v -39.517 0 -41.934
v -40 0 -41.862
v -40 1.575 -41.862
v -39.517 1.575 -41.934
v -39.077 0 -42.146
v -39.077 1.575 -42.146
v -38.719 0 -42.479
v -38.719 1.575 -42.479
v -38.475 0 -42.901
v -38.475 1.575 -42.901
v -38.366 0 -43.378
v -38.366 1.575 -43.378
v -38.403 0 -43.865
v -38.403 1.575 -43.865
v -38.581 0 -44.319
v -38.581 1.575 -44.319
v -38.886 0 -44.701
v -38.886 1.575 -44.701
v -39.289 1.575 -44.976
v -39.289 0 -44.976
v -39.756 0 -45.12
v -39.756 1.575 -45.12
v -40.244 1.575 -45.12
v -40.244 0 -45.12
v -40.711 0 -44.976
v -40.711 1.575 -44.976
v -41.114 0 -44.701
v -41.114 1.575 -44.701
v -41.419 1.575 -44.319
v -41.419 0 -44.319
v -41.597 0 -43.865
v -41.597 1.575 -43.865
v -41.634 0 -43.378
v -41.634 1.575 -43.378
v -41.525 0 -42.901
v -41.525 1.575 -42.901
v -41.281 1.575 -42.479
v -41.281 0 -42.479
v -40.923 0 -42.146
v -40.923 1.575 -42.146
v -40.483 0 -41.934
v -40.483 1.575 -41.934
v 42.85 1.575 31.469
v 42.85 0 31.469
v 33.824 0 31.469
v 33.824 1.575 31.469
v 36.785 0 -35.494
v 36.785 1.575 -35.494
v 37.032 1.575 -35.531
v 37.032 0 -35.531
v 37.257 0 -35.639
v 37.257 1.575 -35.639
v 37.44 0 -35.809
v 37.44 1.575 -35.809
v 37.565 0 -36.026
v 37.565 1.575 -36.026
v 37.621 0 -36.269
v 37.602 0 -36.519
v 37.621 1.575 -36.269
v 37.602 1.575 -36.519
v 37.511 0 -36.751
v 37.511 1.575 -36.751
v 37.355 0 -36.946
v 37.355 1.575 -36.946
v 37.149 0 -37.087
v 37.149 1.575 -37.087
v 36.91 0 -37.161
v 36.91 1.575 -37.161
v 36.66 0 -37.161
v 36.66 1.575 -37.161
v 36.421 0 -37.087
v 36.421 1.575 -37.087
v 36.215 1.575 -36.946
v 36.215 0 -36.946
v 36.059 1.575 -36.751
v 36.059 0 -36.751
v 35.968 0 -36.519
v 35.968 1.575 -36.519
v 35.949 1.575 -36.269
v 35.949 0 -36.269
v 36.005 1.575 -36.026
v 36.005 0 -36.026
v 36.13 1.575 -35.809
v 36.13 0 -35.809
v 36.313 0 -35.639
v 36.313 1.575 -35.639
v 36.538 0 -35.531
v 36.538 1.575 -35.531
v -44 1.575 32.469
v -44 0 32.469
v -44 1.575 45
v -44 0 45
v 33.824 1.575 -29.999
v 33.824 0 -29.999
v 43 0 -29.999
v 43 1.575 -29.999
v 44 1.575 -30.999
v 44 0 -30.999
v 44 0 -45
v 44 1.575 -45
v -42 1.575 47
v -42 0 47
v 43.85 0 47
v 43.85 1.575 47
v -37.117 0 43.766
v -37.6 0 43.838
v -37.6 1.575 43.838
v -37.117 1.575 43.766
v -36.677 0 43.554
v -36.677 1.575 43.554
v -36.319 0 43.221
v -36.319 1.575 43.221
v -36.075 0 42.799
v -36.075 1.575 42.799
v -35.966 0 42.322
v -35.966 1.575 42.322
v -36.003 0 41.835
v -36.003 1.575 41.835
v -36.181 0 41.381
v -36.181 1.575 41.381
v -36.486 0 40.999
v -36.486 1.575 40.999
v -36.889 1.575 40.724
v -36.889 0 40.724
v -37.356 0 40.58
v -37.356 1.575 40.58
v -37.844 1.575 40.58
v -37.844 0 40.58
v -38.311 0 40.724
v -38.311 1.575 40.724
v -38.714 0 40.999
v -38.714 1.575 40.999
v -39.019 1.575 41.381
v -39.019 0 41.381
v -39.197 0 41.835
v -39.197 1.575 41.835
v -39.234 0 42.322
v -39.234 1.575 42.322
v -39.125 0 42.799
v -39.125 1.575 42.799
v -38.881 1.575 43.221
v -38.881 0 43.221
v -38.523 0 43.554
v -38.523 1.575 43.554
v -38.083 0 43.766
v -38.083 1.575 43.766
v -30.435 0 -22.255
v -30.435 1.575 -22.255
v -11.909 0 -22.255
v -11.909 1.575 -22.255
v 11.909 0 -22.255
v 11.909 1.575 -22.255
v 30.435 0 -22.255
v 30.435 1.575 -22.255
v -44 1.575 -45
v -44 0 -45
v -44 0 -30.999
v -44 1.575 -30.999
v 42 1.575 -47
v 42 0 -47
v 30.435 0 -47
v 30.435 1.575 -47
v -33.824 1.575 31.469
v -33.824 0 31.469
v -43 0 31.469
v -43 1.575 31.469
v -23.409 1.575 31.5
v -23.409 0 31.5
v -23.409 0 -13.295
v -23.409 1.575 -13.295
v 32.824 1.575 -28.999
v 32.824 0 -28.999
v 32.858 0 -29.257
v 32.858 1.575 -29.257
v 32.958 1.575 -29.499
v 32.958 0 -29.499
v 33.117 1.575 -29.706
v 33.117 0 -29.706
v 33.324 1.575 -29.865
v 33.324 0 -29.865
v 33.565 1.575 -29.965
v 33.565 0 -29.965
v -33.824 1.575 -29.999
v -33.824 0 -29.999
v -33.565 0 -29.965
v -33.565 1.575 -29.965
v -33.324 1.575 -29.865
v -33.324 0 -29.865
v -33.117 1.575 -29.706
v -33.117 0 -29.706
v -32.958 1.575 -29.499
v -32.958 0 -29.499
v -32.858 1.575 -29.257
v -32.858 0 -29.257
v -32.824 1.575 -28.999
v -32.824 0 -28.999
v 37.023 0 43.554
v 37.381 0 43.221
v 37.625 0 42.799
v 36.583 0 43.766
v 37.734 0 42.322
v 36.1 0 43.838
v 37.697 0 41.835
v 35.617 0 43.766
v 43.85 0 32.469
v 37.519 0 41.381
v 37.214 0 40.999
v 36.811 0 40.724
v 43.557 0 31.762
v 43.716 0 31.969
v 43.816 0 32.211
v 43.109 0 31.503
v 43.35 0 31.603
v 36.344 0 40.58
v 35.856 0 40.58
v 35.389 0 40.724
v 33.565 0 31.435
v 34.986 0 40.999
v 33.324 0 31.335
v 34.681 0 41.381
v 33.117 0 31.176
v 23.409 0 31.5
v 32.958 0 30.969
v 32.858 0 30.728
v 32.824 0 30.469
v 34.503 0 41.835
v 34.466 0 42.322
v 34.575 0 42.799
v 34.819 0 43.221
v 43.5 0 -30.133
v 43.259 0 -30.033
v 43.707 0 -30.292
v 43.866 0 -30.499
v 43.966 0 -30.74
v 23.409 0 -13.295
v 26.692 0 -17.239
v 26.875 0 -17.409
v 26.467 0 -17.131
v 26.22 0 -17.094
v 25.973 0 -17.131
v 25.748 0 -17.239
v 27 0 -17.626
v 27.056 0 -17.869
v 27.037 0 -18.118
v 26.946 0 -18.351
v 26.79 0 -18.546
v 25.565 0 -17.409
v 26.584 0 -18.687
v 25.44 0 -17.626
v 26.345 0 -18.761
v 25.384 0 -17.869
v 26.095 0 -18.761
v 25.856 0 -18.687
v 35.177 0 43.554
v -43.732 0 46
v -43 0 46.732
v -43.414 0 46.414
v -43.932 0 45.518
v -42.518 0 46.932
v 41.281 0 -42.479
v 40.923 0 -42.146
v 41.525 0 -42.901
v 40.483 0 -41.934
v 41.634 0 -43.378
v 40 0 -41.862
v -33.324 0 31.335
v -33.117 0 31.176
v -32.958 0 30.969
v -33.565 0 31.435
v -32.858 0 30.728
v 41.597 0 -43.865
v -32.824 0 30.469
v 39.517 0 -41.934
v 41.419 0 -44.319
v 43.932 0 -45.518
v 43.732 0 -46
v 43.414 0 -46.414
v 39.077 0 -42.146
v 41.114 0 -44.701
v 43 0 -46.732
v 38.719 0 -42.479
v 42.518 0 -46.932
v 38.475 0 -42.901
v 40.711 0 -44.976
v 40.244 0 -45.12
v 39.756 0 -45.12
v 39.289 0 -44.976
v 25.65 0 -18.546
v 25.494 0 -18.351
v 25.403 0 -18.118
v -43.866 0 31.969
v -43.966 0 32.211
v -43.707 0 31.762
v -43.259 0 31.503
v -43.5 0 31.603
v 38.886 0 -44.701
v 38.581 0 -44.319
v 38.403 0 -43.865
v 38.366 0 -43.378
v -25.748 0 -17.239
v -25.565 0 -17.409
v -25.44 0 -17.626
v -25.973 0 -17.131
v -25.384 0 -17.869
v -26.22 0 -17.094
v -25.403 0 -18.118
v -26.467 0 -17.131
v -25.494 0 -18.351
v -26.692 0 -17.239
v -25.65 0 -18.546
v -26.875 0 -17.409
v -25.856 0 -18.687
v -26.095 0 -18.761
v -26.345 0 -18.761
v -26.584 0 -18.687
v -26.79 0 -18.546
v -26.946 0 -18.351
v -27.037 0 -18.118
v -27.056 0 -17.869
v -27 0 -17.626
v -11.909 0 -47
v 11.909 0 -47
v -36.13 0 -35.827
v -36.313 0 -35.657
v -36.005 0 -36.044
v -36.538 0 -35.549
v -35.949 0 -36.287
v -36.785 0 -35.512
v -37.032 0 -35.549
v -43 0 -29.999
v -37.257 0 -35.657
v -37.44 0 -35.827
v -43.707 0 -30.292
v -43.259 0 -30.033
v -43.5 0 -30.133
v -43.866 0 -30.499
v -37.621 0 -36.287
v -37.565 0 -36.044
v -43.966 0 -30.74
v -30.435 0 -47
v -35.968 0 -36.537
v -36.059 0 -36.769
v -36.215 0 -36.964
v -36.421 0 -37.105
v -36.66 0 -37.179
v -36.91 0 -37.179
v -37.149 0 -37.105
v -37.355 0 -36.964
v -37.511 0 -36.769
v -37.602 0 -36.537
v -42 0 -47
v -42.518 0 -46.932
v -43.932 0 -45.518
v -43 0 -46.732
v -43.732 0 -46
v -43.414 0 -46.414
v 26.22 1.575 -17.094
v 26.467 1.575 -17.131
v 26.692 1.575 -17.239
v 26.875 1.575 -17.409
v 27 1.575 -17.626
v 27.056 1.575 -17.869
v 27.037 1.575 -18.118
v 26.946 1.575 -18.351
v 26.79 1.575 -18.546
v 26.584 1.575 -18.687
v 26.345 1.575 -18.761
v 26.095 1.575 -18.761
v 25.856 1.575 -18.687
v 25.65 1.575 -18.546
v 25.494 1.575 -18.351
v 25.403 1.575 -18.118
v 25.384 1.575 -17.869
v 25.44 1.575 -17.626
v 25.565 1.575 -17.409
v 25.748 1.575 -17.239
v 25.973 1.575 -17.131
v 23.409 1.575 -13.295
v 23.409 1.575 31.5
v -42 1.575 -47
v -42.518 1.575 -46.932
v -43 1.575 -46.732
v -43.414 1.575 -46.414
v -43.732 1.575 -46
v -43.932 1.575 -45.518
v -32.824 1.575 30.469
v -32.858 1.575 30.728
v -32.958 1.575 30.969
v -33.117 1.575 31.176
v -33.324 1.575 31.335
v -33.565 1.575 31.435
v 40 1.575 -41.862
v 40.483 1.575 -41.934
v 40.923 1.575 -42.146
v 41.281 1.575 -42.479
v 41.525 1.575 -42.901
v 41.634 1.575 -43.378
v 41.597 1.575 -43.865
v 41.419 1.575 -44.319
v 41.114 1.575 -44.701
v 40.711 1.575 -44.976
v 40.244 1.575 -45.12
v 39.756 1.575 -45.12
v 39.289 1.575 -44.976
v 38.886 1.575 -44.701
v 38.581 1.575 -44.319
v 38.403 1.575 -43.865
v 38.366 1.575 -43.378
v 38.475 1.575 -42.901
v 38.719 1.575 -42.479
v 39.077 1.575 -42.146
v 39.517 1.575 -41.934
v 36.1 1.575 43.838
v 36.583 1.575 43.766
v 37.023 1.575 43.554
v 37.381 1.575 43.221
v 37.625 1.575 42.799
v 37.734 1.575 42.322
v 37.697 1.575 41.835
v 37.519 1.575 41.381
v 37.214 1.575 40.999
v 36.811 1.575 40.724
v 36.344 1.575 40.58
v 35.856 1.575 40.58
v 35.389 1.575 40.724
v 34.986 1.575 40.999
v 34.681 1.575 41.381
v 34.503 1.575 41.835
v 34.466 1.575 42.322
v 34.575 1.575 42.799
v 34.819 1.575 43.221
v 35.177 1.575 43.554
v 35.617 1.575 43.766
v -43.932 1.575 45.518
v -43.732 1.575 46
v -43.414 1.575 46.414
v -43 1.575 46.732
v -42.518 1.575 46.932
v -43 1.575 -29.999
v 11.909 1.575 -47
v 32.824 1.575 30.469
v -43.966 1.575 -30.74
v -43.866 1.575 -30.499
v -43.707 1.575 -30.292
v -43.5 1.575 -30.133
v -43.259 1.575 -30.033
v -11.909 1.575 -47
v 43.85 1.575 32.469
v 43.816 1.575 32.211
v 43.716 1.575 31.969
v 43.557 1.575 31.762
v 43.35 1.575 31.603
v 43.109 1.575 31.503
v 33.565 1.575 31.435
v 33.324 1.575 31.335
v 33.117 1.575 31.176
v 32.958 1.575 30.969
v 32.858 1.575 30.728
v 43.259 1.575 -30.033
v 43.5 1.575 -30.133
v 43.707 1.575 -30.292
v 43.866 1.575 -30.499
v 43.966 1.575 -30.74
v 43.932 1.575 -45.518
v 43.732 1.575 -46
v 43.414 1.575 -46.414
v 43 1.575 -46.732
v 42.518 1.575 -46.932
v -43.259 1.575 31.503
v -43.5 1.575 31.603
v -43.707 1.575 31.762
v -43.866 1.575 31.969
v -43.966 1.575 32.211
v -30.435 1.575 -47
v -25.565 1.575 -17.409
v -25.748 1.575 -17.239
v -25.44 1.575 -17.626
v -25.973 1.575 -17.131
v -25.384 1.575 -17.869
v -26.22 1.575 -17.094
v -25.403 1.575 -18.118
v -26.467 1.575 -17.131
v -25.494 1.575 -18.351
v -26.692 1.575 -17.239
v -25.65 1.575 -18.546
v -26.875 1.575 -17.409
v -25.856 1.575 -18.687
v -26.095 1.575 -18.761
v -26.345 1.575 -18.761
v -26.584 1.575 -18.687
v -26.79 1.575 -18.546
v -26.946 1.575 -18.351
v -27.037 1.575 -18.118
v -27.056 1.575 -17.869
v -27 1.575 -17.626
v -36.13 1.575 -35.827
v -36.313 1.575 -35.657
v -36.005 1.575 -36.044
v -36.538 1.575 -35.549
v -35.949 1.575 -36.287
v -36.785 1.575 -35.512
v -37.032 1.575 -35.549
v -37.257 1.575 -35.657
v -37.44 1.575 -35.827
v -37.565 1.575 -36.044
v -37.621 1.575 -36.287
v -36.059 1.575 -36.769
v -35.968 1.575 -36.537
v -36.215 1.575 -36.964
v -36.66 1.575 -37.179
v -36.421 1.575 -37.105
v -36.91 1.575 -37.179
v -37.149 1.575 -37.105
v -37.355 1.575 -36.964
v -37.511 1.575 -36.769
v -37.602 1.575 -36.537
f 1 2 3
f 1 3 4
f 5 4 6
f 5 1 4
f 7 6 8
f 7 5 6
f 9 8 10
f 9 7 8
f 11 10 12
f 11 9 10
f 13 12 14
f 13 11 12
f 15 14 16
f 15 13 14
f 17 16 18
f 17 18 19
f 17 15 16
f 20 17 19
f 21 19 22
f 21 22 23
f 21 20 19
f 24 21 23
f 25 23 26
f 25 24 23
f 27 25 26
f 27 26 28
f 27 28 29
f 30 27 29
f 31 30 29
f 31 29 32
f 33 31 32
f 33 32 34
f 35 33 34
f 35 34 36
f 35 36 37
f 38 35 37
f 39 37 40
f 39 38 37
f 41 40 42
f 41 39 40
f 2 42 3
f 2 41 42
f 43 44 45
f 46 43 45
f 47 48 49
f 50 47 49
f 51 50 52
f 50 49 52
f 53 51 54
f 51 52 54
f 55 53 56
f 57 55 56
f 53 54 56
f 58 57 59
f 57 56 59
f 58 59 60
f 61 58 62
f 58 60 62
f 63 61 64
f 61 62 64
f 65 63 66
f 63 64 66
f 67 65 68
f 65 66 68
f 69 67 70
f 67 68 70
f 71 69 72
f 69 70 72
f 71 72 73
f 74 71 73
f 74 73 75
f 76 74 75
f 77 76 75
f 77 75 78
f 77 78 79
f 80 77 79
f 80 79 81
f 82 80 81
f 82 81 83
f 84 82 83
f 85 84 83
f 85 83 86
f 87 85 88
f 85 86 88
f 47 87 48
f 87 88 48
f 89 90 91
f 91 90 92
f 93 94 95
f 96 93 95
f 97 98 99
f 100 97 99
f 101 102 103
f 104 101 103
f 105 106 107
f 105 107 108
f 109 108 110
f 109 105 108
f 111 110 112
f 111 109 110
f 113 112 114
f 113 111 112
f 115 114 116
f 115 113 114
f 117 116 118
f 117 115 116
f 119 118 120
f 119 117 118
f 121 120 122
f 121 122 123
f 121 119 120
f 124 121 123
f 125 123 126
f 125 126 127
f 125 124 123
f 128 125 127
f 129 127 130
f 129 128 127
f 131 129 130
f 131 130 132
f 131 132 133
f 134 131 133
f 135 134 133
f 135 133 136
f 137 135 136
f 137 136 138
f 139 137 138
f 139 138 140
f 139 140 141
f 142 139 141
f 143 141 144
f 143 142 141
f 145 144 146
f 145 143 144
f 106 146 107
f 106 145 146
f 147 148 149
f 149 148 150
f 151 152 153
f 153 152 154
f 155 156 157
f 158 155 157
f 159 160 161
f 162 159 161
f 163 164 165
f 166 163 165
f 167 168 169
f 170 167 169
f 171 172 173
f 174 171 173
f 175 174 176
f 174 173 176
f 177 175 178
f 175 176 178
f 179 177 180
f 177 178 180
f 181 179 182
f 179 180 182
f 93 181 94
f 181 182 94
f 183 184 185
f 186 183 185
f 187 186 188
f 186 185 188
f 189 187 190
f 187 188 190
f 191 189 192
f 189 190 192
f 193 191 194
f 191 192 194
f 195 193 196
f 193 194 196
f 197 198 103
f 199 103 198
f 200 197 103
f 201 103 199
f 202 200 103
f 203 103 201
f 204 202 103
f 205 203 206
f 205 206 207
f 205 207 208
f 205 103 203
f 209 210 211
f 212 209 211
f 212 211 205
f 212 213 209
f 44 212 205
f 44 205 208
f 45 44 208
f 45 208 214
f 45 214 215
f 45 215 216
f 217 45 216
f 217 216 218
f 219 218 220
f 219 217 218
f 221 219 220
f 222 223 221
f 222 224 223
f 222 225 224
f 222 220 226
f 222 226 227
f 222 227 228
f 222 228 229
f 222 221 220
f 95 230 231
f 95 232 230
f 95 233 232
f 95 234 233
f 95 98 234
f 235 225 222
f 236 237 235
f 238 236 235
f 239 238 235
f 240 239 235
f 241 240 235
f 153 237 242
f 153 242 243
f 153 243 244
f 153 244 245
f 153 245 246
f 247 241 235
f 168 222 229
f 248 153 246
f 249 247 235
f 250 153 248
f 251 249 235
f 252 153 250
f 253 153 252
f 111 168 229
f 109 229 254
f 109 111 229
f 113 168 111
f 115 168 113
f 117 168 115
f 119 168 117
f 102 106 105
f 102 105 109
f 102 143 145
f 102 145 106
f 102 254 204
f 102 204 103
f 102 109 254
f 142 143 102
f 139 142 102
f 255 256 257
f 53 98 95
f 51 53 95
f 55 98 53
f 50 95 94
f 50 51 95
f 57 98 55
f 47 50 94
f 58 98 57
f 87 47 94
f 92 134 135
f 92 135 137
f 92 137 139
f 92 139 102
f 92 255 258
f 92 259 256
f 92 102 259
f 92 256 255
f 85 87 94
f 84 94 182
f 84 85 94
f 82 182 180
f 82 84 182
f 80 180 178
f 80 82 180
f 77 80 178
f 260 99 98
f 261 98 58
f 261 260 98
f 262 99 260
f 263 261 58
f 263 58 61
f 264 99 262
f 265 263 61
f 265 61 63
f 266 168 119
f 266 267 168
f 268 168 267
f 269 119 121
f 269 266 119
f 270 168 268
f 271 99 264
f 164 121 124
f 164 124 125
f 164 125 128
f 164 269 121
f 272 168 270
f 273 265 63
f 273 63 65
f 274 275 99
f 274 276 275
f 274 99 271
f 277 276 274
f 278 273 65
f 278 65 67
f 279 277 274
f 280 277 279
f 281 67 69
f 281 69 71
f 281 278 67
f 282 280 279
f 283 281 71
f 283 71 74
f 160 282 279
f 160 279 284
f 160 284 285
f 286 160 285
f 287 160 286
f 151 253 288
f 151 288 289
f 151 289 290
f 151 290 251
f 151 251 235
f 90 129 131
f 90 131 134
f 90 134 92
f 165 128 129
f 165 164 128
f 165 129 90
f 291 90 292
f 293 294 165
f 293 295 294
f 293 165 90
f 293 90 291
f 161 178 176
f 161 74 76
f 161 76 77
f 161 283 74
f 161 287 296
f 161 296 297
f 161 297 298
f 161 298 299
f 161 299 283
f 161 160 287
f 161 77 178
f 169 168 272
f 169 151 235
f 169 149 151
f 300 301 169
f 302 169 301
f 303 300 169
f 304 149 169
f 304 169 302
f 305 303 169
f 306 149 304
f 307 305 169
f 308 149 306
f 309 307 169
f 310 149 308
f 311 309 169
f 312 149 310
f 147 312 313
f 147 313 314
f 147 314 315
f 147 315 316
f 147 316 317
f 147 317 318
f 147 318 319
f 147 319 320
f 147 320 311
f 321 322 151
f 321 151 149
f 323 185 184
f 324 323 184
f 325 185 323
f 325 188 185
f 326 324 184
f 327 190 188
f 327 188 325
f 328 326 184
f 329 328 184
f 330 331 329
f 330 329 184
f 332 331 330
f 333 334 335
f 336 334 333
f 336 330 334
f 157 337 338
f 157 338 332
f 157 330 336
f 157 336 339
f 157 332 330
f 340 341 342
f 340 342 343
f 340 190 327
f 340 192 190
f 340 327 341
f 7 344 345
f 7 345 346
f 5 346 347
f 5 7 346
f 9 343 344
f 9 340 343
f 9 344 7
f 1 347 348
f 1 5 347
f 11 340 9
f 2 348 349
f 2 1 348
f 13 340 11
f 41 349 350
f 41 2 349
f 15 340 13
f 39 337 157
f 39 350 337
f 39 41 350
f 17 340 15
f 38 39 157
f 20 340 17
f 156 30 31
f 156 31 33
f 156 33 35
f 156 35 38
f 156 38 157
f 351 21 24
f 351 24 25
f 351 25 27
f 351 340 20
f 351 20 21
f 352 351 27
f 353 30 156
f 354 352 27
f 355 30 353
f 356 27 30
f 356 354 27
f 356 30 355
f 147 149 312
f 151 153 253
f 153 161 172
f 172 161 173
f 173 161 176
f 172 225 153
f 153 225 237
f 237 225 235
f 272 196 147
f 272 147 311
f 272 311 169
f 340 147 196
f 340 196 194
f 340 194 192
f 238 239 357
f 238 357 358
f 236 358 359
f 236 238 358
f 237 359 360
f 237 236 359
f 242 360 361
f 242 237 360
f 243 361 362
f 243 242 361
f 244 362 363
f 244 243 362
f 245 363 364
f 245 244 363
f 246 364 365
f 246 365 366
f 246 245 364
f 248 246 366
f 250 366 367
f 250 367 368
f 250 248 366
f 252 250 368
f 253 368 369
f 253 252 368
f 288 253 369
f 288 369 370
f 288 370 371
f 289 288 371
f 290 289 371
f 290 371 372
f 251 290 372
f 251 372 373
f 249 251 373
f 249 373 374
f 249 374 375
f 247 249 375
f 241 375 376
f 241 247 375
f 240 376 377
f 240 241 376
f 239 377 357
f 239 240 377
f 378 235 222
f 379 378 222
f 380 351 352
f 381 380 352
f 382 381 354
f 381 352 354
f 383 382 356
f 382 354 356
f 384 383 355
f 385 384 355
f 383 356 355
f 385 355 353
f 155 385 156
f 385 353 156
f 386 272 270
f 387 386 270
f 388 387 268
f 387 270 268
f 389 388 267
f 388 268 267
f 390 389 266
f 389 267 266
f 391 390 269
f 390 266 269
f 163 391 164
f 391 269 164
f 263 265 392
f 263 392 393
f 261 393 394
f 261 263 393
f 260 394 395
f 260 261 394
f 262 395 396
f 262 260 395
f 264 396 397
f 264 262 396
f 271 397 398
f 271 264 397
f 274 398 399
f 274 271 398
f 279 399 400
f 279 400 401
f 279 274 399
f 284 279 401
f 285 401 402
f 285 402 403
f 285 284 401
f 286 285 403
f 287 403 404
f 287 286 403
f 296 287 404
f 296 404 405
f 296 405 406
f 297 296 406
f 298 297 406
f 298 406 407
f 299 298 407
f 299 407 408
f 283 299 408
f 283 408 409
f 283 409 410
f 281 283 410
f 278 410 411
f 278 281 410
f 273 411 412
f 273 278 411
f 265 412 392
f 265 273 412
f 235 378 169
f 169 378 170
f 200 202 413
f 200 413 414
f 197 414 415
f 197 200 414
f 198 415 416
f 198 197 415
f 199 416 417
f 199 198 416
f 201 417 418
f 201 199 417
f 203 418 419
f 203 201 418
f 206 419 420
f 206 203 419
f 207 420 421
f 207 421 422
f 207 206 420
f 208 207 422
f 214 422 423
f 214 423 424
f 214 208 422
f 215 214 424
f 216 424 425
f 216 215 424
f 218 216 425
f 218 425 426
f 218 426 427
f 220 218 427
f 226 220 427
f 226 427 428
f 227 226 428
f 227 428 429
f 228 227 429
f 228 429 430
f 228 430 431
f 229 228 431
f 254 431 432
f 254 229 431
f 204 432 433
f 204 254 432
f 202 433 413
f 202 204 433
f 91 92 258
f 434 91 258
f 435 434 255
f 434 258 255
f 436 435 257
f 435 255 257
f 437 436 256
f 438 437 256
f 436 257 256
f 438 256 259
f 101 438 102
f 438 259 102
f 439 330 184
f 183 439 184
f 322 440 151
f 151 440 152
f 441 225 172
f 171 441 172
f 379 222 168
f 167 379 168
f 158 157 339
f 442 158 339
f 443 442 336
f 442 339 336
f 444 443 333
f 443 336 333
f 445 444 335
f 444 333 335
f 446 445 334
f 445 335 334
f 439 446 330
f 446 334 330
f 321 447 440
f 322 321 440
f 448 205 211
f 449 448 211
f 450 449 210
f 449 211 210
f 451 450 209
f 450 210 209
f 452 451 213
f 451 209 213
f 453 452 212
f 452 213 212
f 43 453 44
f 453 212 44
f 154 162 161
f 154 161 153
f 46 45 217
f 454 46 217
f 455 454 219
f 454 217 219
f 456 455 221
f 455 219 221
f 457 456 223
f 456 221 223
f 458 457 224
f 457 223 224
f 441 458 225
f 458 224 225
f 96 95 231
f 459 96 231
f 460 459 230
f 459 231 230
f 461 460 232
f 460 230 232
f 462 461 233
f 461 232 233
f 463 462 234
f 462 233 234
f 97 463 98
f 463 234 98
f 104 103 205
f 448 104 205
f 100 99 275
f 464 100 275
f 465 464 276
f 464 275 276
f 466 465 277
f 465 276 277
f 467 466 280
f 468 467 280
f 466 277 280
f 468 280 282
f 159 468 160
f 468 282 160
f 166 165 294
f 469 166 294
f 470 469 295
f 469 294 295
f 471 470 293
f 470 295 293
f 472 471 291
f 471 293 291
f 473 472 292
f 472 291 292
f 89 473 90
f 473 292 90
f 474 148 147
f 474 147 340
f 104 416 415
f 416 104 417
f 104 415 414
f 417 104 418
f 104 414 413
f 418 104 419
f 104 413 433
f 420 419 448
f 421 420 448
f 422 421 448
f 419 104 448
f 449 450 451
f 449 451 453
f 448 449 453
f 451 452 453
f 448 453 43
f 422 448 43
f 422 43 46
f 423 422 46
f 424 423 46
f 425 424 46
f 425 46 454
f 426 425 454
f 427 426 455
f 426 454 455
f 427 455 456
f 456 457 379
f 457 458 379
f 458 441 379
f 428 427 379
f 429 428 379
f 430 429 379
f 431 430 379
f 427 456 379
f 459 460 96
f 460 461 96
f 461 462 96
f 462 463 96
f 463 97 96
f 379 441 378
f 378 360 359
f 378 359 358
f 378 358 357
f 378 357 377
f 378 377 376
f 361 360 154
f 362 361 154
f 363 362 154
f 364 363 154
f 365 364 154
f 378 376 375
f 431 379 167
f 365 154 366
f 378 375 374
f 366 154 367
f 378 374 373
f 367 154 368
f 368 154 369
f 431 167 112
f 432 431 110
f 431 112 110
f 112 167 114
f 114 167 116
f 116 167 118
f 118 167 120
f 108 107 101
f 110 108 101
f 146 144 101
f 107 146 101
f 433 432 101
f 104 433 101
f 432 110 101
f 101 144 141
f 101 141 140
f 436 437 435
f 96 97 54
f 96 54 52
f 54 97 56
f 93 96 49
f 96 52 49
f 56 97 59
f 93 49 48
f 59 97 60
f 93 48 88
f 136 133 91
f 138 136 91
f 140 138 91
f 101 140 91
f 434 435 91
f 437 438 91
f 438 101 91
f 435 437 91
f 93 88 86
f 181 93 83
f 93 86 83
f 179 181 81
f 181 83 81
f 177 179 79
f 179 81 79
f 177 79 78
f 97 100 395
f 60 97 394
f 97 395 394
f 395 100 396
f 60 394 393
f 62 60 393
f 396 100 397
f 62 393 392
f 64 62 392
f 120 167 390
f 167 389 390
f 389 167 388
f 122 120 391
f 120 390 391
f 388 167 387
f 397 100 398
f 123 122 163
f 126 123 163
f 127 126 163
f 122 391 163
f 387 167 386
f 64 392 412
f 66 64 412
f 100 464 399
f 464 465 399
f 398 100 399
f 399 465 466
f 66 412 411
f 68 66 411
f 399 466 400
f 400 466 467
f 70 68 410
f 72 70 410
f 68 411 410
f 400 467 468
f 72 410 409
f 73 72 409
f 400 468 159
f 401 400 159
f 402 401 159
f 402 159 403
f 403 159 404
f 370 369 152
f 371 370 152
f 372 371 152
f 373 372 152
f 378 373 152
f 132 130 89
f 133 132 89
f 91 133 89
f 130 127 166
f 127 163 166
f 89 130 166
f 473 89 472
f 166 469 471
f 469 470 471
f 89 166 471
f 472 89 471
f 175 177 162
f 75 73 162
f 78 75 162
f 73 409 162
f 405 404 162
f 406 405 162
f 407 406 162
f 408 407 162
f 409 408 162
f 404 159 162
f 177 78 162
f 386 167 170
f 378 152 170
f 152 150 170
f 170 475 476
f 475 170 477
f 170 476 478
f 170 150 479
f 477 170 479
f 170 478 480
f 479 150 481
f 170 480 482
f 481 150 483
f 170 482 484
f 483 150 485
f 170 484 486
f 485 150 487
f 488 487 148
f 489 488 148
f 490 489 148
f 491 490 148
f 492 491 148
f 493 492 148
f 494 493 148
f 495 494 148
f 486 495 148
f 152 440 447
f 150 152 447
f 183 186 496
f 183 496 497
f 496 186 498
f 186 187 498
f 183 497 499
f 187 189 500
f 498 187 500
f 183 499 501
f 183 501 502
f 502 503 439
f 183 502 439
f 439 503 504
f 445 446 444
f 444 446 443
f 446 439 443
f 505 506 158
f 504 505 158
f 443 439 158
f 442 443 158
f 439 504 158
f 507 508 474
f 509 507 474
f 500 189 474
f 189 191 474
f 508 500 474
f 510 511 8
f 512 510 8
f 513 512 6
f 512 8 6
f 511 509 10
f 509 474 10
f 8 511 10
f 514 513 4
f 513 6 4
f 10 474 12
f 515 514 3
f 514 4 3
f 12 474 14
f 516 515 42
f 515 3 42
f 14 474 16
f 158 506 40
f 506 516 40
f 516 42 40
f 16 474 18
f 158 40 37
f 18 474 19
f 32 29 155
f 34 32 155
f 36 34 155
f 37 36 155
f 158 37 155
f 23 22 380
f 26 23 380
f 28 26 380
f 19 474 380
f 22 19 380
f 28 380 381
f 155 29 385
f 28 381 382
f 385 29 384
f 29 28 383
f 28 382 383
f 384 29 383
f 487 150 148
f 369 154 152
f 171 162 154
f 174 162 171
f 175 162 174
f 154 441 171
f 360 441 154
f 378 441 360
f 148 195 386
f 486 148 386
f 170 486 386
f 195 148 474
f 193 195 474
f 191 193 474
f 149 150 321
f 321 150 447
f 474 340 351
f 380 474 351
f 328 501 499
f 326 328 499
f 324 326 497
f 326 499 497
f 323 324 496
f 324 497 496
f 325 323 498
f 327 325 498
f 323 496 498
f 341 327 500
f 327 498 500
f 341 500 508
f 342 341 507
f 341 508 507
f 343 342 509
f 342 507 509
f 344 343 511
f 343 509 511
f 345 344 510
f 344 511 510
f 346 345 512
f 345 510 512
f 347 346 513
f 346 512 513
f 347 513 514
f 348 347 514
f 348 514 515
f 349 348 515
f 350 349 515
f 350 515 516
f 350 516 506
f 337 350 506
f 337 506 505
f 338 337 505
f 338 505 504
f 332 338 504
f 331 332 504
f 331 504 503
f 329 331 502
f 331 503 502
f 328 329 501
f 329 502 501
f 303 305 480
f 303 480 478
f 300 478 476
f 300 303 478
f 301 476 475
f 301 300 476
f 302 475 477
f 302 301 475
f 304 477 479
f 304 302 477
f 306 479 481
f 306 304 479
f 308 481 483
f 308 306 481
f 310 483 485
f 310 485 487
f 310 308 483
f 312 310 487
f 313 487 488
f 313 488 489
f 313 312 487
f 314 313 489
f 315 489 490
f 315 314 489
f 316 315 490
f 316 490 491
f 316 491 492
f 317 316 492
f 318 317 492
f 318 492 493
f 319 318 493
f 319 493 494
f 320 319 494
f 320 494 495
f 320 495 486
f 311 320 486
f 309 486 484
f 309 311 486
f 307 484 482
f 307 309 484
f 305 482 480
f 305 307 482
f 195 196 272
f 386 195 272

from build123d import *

# Parameters (mm, degrees)
SKETCH1_R           = 1.6383
SKETCH1_R_2         = 0.8382
BOSS_EXTRUDE1_DEPTH = 1.575
CUT_EXTRUDE1_DEPTH  = 2.54
SKETCH15_R          = 0.8382
CUT_EXTRUDE5_DEPTH  = 1.575
BOSS_EXTRUDE2_DEPTH = 1.575


with BuildPart() as part:
    # Sketch1 → Boss-Extrude1 (new body)
    with BuildSketch(Plane(origin=(0, 0, 0), x_dir=(1, 0, 0), z_dir=(0, 1, 0))):
        with BuildLine():
            Line((-44, 45), (-44, 30.998648377))
            ThreePointArc((-44, 30.998648377), (-43.707106781, 30.291541596), (-43, 29.998648377))
            Line((-43, 29.998648377), (-33.824, 29.998648377))
            ThreePointArc((-33.824, 29.998648377), (-33.116893219, 29.705755158), (-32.824, 28.998648377))
            Line((-32.824, 28.998648377), (-32.824, -30.469351623))
            ThreePointArc((-32.824, -30.469351623), (-33.116893219, -31.176458404), (-33.824, -31.469351623))
            Line((-33.824, -31.469351623), (-36.100000052, -31.469351623))
            Line((-36.100000052, -31.469351623), (-42.999999948, -31.469351623))
            ThreePointArc((-42.999999948, -31.469351623), (-43.707106729, -31.762244842), (-43.999999948, -32.469351623))
            Line((-43.999999948, -32.469351623), (-43.999999948, -38.977))
            Line((-43.999999948, -38.977), (-43.999999948, -45))
            ThreePointArc((-43.999999948, -45), (-43.41421351, -46.414213562), (-41.999999948, -47))
            Line((-41.999999948, -47), (42.705916546, -47))
            Line((42.705916546, -47), (43.849731117, -47))
            Line((43.849731117, -47), (43.849731117, -38.27))
            Line((43.849731117, -38.27), (43.849731117, -32.469351623))
            ThreePointArc((43.849731117, -32.469351623), (43.556837899, -31.762244842), (42.849731117, -31.469351623))
            Line((42.849731117, -31.469351623), (36.100000052, -31.469351623))
            Line((36.100000052, -31.469351623), (33.824, -31.469351623))
            ThreePointArc((33.824, -31.469351623), (33.116893219, -31.176458404), (32.824, -30.469351623))
            Line((32.824, -30.469351623), (32.824, 28.998648377))
            ThreePointArc((32.824, 28.998648377), (33.116893219, 29.705755158), (33.824, 29.998648377))
            Line((33.824, 29.998648377), (43, 29.998648377))
            ThreePointArc((43, 29.998648377), (43.707106781, 30.291541596), (44, 30.998648377))
            Line((44, 30.998648377), (44, 31.284))
            Line((44, 31.284), (44, 45))
            ThreePointArc((44, 45), (43.414213562, 46.414213562), (42, 47))
            Line((42, 47), (-42, 47))
            ThreePointArc((-42, 47), (-43.414213562, 46.414213562), (-44, 45))
        make_face()
        with Locations(Location((40, 43.5, 0), (0, 0, 270))):
            Circle(SKETCH1_R, mode=Mode.SUBTRACT)
        with Locations(Location((-40, 43.5, 0), (0, 0, 270))):
            Circle(SKETCH1_R, mode=Mode.SUBTRACT)
        with Locations(Location((-37.599999948, -42.2, 0), (0, 0, 270))):
            Circle(SKETCH1_R, mode=Mode.SUBTRACT)
        with Locations(Location((36.100000052, -42.2, 0), (0, 0, 270))):
            Circle(SKETCH1_R, mode=Mode.SUBTRACT)
        with Locations(Location((26.22, 17.931928709, 0), (0, 0, 270))):
            Circle(SKETCH1_R_2, mode=Mode.SUBTRACT)
        with Locations(Location((-26.22, 17.931928709, 0), (0, 0, 270))):
            Circle(SKETCH1_R_2, mode=Mode.SUBTRACT)
        Polygon((23.409, -31.5), (-23.409, -31.5), (-23.409, 13.29544), (-12.909, 13.29544), (-12.909, 25.99544), (12.909, 25.99544), (12.909, 13.29544), (23.409, 13.29544), align=None, mode=Mode.SUBTRACT)
    extrude(amount=BOSS_EXTRUDE1_DEPTH)

    # Sketch2 → Cut-Extrude1 (cut)
    with BuildSketch(Plane(origin=(0, 1.575, 0), x_dir=(1, 0, 0), z_dir=(0, 1, 0))):
        Polygon((-12.909, 19.06), (-30.435, 19.06), (-30.435, 47), (30.435, 47), (30.435, 19.06), (12.909, 19.06), (12.909, 25.99544), (-12.909, 25.99544), align=None)
    extrude(amount=-CUT_EXTRUDE1_DEPTH, mode=Mode.SUBTRACT)

    # Sketch15 → Cut-Extrude5 (cut)
    with BuildSketch(Plane(origin=(0, 1.575, 0), x_dir=(1, 0, 0), z_dir=(0, 1, 0))):
        with Locations(Location((-36.785, 36.35, 0), (0, 0, 270))):
            Circle(SKETCH15_R)
        with Locations(Location((36.785, 36.332, 0), (0, 0, 270))):
            Circle(SKETCH15_R)
    extrude(amount=-CUT_EXTRUDE5_DEPTH, mode=Mode.SUBTRACT)

    # Sketch16 → Boss-Extrude2 (add)
    with BuildSketch(Plane(origin=(0, 1.575, 0), x_dir=(1, 0, 0), z_dir=(0, 1, 0))):
        Polygon((12.909, 19.06), (12.909, 13.29544), (-12.909, 13.29544), (-12.909, 19.06), (-30.435, 19.06), (-30.435, 22.25535429), (-11.909, 22.25535429), (-11.909, 47), (11.909, 47), (11.909, 22.25535429), (30.435, 22.25535429), (30.435, 19.06), align=None)
    extrude(amount=-BOSS_EXTRUDE2_DEPTH)


solid = part.part
